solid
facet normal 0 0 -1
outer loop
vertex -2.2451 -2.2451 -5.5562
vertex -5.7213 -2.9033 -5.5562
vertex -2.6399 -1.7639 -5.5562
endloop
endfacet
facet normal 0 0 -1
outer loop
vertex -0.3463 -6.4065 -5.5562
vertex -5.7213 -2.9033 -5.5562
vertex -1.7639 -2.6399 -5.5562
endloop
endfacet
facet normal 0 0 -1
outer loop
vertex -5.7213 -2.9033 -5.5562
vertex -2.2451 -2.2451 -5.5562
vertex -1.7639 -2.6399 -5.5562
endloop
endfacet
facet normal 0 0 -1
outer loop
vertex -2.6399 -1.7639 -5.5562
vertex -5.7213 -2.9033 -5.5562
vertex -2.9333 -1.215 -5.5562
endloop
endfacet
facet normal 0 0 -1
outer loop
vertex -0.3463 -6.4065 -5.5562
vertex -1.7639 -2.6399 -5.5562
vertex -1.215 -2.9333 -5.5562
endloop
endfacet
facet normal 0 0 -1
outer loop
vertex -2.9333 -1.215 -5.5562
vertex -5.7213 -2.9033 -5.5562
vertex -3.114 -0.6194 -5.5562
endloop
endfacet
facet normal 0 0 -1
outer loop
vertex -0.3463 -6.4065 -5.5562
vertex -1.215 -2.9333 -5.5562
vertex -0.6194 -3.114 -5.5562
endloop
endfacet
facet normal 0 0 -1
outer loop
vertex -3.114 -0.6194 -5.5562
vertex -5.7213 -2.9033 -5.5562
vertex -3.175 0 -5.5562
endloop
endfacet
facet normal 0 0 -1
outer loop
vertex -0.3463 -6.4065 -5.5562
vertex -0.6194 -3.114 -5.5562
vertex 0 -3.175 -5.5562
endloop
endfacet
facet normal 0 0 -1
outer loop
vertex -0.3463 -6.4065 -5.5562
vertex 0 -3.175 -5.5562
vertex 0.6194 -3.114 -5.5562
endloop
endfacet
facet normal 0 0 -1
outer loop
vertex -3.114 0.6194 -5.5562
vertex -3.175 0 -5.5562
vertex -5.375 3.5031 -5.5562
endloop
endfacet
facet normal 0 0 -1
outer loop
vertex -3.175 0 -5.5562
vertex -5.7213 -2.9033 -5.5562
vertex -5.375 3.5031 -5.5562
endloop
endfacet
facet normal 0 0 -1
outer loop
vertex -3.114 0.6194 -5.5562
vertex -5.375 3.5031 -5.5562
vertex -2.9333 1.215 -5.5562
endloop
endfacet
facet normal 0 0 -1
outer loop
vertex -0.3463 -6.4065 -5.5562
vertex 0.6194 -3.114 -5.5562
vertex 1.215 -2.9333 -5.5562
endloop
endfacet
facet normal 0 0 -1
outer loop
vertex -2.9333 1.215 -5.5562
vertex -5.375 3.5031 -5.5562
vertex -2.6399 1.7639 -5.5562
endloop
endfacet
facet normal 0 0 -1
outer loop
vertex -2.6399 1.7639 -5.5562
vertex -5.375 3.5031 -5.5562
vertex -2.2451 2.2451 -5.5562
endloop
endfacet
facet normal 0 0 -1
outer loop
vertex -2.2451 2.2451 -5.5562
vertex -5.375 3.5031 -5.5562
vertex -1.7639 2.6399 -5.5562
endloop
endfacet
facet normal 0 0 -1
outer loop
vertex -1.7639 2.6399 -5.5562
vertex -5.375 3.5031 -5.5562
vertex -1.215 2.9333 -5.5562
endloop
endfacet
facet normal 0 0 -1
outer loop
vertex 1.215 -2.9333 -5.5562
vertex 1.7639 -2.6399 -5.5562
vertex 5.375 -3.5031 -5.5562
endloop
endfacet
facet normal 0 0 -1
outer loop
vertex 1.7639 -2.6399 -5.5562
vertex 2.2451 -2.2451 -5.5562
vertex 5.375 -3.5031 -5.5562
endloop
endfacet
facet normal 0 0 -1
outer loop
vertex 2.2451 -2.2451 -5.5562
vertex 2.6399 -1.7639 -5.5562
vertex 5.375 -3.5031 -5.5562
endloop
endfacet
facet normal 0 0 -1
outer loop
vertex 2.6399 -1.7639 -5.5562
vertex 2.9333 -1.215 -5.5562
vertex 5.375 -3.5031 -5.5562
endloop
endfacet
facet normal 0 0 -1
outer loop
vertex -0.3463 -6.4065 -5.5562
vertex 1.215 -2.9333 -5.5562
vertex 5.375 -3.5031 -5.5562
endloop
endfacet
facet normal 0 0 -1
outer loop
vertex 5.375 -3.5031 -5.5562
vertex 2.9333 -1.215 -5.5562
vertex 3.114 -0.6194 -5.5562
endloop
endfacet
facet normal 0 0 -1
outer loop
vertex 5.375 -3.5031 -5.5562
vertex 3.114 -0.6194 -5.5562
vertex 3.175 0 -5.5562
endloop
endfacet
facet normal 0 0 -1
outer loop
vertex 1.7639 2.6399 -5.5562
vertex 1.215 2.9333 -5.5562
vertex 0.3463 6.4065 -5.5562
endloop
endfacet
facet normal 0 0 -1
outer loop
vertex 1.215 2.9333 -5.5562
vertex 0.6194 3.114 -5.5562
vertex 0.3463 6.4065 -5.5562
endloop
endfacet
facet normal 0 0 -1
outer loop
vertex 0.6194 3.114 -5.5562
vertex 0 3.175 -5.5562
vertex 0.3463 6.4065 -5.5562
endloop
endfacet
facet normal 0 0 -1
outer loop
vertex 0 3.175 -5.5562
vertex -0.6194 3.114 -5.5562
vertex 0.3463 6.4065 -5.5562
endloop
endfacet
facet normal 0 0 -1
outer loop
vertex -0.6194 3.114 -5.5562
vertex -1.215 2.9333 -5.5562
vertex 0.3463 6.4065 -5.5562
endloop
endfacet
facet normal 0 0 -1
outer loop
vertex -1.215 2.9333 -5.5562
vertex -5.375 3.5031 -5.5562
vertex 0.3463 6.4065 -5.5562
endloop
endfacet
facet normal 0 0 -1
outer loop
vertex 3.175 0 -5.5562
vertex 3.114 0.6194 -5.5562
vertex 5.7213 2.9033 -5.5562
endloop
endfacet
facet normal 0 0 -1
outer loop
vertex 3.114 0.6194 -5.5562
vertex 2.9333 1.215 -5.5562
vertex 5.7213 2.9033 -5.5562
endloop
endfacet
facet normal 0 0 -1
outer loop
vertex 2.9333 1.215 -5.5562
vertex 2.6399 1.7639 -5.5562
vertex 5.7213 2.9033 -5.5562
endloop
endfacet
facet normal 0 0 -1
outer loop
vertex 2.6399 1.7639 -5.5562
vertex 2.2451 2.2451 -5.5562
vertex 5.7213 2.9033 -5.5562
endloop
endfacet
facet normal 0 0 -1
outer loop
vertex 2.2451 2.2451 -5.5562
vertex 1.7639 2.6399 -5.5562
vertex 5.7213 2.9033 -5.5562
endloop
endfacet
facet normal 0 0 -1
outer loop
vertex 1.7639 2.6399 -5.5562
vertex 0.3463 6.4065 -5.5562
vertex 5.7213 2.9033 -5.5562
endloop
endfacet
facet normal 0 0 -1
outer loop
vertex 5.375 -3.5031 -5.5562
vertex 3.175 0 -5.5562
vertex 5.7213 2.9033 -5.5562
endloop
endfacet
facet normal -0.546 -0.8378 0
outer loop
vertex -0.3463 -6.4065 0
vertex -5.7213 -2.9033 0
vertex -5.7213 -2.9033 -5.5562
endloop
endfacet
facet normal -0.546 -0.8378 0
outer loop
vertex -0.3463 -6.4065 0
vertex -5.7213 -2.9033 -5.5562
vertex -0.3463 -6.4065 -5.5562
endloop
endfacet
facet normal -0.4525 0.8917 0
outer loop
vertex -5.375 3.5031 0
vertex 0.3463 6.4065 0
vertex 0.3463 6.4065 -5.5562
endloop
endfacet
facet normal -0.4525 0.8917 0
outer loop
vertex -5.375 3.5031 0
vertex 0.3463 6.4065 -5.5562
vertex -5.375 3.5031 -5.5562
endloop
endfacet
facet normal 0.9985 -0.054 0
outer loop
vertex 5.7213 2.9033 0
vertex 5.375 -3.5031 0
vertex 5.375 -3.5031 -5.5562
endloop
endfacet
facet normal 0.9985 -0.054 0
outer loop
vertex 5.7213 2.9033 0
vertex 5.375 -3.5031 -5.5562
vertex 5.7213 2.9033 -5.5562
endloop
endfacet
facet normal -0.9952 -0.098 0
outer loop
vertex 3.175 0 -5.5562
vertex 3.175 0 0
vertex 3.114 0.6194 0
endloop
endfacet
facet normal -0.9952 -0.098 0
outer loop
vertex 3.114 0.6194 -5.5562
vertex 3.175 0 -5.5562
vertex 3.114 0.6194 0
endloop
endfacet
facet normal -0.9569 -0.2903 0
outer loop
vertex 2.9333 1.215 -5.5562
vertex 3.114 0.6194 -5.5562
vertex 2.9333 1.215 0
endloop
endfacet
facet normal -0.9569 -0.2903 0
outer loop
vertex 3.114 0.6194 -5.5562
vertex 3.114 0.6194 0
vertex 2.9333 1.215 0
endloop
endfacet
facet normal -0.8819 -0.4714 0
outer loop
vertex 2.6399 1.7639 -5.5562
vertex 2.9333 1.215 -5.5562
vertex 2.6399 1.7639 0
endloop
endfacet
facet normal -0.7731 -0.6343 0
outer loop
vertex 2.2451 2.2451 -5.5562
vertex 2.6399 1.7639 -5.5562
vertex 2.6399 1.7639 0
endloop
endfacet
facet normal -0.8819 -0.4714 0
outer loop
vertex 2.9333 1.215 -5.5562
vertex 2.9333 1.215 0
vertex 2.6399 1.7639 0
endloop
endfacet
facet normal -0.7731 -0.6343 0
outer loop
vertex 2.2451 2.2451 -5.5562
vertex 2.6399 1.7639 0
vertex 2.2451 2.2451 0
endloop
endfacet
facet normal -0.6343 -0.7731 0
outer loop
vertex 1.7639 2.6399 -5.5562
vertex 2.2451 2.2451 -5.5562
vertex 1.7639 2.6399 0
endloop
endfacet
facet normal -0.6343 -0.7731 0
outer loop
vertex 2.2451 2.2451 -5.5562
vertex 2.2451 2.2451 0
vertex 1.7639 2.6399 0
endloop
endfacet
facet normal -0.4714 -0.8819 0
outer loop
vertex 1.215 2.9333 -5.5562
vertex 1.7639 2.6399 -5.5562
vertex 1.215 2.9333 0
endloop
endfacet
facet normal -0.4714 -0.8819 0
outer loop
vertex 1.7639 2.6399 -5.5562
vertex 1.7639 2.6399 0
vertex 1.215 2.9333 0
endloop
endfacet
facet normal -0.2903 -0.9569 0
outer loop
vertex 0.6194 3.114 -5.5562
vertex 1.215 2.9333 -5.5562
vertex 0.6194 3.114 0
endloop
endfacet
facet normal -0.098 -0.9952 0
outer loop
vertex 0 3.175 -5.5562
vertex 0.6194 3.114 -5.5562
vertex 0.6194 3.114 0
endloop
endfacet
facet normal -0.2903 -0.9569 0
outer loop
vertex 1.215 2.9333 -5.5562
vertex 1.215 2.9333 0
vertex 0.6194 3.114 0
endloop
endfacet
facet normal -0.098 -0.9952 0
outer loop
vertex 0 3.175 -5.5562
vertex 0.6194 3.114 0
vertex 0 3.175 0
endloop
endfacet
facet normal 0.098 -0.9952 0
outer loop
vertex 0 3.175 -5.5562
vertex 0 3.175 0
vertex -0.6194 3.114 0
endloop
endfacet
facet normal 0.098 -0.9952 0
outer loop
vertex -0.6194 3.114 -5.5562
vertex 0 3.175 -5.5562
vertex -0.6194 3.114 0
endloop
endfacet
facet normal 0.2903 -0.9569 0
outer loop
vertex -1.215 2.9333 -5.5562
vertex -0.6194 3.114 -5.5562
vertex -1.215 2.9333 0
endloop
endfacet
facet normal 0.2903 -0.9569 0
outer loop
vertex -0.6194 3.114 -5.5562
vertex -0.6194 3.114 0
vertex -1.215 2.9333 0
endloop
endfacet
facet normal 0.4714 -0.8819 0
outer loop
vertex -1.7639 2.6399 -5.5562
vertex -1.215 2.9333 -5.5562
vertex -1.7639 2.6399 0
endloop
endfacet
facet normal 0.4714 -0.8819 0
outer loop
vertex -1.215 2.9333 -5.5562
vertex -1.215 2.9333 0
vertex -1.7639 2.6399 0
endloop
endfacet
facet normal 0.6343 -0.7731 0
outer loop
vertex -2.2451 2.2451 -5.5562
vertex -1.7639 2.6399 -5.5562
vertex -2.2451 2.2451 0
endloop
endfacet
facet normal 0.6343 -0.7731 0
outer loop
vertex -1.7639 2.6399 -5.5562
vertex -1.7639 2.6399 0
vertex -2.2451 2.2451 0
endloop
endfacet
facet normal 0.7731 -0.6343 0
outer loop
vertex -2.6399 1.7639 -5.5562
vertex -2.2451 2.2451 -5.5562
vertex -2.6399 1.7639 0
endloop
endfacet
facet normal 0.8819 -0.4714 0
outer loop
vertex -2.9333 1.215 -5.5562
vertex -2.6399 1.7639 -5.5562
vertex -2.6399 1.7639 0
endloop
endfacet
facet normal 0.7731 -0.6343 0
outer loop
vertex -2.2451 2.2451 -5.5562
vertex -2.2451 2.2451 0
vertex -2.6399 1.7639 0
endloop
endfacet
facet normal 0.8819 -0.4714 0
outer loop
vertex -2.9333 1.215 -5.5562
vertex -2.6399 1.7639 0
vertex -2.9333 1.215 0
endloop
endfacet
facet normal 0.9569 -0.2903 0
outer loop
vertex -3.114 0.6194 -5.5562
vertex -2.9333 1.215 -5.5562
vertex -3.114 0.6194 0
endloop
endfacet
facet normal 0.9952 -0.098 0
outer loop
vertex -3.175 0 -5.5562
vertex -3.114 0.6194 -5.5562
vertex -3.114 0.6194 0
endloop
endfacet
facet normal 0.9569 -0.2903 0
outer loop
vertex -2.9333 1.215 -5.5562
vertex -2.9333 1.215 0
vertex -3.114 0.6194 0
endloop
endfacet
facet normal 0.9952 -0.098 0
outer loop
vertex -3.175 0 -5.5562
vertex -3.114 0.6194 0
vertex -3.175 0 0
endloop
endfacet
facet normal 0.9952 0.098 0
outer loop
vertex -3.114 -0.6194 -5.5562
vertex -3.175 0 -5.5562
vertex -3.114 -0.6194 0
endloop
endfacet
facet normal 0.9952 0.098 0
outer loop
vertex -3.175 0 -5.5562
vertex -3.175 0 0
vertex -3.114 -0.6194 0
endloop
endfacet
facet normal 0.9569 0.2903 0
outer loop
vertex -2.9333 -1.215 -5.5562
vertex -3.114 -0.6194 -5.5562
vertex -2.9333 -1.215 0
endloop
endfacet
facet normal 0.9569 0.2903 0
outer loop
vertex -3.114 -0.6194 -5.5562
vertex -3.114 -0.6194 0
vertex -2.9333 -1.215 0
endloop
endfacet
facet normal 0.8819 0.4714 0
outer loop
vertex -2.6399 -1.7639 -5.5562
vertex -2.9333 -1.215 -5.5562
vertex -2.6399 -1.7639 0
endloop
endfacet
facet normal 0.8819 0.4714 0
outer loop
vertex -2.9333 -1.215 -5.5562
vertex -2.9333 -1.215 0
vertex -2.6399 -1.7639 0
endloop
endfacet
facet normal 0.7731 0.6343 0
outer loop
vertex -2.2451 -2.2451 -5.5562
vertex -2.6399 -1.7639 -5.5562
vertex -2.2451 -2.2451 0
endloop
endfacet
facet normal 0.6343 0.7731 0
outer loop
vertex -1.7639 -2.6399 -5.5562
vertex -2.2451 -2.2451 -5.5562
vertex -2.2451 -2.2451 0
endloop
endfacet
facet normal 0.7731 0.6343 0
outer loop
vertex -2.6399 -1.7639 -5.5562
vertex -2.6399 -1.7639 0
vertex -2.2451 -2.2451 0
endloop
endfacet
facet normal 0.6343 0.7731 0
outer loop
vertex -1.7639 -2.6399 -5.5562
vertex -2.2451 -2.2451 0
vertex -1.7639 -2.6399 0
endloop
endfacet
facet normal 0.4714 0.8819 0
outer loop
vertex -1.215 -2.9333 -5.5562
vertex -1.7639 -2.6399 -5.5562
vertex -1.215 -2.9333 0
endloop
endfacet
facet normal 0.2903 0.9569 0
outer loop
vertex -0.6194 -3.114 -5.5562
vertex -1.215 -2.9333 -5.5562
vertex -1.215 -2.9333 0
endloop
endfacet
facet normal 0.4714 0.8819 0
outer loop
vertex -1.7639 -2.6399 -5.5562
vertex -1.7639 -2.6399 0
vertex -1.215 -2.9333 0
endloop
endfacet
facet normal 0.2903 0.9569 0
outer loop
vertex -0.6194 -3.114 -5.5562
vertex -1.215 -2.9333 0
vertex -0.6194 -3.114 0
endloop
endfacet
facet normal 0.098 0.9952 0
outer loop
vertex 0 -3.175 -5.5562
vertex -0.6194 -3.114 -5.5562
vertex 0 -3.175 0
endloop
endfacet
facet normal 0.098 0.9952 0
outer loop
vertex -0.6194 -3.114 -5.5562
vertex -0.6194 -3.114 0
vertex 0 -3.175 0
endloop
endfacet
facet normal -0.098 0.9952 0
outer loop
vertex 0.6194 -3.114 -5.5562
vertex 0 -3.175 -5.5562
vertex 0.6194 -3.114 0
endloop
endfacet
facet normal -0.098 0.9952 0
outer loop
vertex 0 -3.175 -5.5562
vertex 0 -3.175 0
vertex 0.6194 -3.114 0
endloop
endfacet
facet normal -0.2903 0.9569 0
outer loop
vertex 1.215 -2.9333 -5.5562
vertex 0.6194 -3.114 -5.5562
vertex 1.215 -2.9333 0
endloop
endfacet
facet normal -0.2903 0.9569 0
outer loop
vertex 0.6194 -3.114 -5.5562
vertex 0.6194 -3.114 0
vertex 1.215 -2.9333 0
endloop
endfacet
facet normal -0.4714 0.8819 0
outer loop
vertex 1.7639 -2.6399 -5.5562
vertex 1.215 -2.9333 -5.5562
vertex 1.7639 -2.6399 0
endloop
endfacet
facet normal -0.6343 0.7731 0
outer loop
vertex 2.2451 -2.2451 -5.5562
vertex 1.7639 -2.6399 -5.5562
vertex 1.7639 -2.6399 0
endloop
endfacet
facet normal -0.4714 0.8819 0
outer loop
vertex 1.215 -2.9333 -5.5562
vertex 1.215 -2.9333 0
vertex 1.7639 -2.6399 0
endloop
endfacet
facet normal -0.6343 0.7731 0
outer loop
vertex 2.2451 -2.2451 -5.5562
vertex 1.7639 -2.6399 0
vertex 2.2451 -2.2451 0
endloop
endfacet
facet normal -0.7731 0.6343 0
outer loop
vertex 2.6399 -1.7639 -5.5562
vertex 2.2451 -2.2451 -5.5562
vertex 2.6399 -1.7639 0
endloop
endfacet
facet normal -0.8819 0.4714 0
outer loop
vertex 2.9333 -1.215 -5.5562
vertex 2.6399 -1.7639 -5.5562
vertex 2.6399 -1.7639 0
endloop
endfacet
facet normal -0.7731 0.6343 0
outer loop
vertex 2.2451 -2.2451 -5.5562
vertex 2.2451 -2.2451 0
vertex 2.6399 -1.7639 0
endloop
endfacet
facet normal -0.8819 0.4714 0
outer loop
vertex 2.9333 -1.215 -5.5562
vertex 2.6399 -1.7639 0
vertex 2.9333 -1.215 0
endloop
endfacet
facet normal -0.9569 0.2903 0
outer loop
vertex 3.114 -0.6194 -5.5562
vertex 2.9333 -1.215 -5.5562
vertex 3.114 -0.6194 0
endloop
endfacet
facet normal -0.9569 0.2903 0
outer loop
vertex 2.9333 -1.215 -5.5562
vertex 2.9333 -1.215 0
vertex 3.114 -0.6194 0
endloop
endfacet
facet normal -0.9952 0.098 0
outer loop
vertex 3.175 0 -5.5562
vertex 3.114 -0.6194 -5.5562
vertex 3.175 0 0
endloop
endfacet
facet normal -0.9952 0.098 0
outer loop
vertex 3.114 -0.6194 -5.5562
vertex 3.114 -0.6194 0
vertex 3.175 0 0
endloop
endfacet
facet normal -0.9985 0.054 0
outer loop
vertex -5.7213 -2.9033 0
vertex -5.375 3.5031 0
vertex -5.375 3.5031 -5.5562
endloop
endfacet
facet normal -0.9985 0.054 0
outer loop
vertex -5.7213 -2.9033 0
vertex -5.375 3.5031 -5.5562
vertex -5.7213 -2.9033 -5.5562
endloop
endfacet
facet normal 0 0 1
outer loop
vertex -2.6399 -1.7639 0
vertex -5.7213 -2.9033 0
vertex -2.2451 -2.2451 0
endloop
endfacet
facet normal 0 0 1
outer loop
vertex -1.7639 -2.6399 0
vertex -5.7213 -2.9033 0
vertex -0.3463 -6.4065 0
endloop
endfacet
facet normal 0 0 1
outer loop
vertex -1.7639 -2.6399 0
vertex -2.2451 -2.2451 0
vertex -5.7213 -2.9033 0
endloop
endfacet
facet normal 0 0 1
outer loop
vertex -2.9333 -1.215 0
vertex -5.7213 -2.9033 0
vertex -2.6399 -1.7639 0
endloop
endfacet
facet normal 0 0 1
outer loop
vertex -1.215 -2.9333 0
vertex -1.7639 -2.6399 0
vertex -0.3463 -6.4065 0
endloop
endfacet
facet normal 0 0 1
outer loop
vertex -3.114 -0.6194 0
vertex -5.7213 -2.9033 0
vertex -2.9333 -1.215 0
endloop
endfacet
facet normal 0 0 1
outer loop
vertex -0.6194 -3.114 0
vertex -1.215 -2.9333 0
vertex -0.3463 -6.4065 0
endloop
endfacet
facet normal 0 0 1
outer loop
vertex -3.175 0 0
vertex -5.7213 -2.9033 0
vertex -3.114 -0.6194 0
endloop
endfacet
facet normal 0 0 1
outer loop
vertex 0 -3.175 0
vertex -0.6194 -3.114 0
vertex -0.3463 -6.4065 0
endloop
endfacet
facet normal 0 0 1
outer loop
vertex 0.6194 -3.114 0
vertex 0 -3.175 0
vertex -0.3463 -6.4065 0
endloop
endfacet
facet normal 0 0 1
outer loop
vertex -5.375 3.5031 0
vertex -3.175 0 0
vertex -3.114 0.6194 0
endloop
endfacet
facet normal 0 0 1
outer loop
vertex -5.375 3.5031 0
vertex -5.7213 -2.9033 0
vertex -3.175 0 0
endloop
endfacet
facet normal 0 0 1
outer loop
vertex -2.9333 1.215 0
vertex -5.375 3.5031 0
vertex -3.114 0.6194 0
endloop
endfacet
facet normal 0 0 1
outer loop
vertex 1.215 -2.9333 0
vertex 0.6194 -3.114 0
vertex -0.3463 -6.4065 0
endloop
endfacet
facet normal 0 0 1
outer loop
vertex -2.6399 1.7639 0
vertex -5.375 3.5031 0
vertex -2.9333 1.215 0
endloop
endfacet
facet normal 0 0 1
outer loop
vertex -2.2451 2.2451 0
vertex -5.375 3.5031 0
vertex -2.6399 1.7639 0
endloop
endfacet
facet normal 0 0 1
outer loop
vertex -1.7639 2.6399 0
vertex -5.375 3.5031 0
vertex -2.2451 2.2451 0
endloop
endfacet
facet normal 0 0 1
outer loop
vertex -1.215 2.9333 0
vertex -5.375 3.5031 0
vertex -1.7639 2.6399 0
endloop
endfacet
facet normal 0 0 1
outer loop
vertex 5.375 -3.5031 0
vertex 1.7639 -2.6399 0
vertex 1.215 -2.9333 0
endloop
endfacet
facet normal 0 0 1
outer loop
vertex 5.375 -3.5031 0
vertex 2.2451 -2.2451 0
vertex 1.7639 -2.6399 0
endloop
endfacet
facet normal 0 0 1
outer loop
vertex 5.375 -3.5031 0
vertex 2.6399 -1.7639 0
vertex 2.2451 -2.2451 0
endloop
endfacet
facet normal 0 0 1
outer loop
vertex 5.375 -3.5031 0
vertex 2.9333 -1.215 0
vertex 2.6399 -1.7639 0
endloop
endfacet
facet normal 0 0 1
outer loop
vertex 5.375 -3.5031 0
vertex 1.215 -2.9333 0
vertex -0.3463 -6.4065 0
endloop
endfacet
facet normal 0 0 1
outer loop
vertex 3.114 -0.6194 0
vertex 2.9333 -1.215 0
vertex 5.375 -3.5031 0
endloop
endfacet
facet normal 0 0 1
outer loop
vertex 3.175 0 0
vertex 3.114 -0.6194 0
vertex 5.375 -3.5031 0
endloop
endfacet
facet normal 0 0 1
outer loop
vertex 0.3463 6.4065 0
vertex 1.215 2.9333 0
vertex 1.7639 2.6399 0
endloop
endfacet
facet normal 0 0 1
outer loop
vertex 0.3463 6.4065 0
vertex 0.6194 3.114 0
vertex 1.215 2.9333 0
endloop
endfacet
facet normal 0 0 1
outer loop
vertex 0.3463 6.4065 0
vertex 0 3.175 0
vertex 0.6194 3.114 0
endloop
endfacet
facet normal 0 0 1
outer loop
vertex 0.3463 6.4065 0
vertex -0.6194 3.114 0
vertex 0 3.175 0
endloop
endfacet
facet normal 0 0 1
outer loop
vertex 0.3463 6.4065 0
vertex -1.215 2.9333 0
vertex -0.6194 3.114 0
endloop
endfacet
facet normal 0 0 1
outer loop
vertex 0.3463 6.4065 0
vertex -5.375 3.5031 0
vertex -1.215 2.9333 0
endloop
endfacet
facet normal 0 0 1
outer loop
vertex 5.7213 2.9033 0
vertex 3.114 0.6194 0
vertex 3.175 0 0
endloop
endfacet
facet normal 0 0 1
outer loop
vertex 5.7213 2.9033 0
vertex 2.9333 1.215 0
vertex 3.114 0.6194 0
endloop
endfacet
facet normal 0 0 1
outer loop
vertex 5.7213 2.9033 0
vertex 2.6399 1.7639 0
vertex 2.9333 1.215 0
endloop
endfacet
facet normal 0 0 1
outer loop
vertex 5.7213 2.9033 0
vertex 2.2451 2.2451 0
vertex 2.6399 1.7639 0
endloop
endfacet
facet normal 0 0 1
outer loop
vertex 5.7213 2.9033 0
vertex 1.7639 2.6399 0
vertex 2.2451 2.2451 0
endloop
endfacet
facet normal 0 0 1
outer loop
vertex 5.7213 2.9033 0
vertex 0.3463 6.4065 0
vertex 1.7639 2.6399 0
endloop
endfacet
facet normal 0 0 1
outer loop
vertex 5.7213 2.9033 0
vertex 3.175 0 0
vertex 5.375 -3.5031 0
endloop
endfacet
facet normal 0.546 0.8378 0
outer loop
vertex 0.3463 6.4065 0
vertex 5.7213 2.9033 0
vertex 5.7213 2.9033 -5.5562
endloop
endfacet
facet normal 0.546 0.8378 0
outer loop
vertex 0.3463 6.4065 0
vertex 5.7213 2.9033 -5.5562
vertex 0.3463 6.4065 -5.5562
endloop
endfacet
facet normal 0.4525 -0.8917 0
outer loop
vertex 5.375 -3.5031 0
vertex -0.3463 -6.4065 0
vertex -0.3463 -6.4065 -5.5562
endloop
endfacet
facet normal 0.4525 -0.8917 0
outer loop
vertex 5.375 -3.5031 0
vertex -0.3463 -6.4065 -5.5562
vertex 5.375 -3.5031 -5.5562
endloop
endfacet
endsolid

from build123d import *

# Parameters (mm, degrees)
F1_DEPTH = 5.55625
F2_R     = 3.175
F3_DEPTH = 5.55625


with BuildPart() as f1:
    # F0 (on Top) → F1 (new body)
    with BuildSketch(Plane.XY):
        Polygon((-0.346295, -6.406452), (5.375003, -3.503126), (5.721298, 2.903326), (0.346295, 6.406452), (-5.375003, 3.503126), (-5.721298, -2.903326), align=None)
    extrude(amount=-F1_DEPTH)

    # F2 (on face) → F3 (cut, through all)
    with BuildSketch(Plane.XY):
        Circle(F2_R)
    extrude(amount=-F3_DEPTH, mode=Mode.SUBTRACT)


solid = f1.part
